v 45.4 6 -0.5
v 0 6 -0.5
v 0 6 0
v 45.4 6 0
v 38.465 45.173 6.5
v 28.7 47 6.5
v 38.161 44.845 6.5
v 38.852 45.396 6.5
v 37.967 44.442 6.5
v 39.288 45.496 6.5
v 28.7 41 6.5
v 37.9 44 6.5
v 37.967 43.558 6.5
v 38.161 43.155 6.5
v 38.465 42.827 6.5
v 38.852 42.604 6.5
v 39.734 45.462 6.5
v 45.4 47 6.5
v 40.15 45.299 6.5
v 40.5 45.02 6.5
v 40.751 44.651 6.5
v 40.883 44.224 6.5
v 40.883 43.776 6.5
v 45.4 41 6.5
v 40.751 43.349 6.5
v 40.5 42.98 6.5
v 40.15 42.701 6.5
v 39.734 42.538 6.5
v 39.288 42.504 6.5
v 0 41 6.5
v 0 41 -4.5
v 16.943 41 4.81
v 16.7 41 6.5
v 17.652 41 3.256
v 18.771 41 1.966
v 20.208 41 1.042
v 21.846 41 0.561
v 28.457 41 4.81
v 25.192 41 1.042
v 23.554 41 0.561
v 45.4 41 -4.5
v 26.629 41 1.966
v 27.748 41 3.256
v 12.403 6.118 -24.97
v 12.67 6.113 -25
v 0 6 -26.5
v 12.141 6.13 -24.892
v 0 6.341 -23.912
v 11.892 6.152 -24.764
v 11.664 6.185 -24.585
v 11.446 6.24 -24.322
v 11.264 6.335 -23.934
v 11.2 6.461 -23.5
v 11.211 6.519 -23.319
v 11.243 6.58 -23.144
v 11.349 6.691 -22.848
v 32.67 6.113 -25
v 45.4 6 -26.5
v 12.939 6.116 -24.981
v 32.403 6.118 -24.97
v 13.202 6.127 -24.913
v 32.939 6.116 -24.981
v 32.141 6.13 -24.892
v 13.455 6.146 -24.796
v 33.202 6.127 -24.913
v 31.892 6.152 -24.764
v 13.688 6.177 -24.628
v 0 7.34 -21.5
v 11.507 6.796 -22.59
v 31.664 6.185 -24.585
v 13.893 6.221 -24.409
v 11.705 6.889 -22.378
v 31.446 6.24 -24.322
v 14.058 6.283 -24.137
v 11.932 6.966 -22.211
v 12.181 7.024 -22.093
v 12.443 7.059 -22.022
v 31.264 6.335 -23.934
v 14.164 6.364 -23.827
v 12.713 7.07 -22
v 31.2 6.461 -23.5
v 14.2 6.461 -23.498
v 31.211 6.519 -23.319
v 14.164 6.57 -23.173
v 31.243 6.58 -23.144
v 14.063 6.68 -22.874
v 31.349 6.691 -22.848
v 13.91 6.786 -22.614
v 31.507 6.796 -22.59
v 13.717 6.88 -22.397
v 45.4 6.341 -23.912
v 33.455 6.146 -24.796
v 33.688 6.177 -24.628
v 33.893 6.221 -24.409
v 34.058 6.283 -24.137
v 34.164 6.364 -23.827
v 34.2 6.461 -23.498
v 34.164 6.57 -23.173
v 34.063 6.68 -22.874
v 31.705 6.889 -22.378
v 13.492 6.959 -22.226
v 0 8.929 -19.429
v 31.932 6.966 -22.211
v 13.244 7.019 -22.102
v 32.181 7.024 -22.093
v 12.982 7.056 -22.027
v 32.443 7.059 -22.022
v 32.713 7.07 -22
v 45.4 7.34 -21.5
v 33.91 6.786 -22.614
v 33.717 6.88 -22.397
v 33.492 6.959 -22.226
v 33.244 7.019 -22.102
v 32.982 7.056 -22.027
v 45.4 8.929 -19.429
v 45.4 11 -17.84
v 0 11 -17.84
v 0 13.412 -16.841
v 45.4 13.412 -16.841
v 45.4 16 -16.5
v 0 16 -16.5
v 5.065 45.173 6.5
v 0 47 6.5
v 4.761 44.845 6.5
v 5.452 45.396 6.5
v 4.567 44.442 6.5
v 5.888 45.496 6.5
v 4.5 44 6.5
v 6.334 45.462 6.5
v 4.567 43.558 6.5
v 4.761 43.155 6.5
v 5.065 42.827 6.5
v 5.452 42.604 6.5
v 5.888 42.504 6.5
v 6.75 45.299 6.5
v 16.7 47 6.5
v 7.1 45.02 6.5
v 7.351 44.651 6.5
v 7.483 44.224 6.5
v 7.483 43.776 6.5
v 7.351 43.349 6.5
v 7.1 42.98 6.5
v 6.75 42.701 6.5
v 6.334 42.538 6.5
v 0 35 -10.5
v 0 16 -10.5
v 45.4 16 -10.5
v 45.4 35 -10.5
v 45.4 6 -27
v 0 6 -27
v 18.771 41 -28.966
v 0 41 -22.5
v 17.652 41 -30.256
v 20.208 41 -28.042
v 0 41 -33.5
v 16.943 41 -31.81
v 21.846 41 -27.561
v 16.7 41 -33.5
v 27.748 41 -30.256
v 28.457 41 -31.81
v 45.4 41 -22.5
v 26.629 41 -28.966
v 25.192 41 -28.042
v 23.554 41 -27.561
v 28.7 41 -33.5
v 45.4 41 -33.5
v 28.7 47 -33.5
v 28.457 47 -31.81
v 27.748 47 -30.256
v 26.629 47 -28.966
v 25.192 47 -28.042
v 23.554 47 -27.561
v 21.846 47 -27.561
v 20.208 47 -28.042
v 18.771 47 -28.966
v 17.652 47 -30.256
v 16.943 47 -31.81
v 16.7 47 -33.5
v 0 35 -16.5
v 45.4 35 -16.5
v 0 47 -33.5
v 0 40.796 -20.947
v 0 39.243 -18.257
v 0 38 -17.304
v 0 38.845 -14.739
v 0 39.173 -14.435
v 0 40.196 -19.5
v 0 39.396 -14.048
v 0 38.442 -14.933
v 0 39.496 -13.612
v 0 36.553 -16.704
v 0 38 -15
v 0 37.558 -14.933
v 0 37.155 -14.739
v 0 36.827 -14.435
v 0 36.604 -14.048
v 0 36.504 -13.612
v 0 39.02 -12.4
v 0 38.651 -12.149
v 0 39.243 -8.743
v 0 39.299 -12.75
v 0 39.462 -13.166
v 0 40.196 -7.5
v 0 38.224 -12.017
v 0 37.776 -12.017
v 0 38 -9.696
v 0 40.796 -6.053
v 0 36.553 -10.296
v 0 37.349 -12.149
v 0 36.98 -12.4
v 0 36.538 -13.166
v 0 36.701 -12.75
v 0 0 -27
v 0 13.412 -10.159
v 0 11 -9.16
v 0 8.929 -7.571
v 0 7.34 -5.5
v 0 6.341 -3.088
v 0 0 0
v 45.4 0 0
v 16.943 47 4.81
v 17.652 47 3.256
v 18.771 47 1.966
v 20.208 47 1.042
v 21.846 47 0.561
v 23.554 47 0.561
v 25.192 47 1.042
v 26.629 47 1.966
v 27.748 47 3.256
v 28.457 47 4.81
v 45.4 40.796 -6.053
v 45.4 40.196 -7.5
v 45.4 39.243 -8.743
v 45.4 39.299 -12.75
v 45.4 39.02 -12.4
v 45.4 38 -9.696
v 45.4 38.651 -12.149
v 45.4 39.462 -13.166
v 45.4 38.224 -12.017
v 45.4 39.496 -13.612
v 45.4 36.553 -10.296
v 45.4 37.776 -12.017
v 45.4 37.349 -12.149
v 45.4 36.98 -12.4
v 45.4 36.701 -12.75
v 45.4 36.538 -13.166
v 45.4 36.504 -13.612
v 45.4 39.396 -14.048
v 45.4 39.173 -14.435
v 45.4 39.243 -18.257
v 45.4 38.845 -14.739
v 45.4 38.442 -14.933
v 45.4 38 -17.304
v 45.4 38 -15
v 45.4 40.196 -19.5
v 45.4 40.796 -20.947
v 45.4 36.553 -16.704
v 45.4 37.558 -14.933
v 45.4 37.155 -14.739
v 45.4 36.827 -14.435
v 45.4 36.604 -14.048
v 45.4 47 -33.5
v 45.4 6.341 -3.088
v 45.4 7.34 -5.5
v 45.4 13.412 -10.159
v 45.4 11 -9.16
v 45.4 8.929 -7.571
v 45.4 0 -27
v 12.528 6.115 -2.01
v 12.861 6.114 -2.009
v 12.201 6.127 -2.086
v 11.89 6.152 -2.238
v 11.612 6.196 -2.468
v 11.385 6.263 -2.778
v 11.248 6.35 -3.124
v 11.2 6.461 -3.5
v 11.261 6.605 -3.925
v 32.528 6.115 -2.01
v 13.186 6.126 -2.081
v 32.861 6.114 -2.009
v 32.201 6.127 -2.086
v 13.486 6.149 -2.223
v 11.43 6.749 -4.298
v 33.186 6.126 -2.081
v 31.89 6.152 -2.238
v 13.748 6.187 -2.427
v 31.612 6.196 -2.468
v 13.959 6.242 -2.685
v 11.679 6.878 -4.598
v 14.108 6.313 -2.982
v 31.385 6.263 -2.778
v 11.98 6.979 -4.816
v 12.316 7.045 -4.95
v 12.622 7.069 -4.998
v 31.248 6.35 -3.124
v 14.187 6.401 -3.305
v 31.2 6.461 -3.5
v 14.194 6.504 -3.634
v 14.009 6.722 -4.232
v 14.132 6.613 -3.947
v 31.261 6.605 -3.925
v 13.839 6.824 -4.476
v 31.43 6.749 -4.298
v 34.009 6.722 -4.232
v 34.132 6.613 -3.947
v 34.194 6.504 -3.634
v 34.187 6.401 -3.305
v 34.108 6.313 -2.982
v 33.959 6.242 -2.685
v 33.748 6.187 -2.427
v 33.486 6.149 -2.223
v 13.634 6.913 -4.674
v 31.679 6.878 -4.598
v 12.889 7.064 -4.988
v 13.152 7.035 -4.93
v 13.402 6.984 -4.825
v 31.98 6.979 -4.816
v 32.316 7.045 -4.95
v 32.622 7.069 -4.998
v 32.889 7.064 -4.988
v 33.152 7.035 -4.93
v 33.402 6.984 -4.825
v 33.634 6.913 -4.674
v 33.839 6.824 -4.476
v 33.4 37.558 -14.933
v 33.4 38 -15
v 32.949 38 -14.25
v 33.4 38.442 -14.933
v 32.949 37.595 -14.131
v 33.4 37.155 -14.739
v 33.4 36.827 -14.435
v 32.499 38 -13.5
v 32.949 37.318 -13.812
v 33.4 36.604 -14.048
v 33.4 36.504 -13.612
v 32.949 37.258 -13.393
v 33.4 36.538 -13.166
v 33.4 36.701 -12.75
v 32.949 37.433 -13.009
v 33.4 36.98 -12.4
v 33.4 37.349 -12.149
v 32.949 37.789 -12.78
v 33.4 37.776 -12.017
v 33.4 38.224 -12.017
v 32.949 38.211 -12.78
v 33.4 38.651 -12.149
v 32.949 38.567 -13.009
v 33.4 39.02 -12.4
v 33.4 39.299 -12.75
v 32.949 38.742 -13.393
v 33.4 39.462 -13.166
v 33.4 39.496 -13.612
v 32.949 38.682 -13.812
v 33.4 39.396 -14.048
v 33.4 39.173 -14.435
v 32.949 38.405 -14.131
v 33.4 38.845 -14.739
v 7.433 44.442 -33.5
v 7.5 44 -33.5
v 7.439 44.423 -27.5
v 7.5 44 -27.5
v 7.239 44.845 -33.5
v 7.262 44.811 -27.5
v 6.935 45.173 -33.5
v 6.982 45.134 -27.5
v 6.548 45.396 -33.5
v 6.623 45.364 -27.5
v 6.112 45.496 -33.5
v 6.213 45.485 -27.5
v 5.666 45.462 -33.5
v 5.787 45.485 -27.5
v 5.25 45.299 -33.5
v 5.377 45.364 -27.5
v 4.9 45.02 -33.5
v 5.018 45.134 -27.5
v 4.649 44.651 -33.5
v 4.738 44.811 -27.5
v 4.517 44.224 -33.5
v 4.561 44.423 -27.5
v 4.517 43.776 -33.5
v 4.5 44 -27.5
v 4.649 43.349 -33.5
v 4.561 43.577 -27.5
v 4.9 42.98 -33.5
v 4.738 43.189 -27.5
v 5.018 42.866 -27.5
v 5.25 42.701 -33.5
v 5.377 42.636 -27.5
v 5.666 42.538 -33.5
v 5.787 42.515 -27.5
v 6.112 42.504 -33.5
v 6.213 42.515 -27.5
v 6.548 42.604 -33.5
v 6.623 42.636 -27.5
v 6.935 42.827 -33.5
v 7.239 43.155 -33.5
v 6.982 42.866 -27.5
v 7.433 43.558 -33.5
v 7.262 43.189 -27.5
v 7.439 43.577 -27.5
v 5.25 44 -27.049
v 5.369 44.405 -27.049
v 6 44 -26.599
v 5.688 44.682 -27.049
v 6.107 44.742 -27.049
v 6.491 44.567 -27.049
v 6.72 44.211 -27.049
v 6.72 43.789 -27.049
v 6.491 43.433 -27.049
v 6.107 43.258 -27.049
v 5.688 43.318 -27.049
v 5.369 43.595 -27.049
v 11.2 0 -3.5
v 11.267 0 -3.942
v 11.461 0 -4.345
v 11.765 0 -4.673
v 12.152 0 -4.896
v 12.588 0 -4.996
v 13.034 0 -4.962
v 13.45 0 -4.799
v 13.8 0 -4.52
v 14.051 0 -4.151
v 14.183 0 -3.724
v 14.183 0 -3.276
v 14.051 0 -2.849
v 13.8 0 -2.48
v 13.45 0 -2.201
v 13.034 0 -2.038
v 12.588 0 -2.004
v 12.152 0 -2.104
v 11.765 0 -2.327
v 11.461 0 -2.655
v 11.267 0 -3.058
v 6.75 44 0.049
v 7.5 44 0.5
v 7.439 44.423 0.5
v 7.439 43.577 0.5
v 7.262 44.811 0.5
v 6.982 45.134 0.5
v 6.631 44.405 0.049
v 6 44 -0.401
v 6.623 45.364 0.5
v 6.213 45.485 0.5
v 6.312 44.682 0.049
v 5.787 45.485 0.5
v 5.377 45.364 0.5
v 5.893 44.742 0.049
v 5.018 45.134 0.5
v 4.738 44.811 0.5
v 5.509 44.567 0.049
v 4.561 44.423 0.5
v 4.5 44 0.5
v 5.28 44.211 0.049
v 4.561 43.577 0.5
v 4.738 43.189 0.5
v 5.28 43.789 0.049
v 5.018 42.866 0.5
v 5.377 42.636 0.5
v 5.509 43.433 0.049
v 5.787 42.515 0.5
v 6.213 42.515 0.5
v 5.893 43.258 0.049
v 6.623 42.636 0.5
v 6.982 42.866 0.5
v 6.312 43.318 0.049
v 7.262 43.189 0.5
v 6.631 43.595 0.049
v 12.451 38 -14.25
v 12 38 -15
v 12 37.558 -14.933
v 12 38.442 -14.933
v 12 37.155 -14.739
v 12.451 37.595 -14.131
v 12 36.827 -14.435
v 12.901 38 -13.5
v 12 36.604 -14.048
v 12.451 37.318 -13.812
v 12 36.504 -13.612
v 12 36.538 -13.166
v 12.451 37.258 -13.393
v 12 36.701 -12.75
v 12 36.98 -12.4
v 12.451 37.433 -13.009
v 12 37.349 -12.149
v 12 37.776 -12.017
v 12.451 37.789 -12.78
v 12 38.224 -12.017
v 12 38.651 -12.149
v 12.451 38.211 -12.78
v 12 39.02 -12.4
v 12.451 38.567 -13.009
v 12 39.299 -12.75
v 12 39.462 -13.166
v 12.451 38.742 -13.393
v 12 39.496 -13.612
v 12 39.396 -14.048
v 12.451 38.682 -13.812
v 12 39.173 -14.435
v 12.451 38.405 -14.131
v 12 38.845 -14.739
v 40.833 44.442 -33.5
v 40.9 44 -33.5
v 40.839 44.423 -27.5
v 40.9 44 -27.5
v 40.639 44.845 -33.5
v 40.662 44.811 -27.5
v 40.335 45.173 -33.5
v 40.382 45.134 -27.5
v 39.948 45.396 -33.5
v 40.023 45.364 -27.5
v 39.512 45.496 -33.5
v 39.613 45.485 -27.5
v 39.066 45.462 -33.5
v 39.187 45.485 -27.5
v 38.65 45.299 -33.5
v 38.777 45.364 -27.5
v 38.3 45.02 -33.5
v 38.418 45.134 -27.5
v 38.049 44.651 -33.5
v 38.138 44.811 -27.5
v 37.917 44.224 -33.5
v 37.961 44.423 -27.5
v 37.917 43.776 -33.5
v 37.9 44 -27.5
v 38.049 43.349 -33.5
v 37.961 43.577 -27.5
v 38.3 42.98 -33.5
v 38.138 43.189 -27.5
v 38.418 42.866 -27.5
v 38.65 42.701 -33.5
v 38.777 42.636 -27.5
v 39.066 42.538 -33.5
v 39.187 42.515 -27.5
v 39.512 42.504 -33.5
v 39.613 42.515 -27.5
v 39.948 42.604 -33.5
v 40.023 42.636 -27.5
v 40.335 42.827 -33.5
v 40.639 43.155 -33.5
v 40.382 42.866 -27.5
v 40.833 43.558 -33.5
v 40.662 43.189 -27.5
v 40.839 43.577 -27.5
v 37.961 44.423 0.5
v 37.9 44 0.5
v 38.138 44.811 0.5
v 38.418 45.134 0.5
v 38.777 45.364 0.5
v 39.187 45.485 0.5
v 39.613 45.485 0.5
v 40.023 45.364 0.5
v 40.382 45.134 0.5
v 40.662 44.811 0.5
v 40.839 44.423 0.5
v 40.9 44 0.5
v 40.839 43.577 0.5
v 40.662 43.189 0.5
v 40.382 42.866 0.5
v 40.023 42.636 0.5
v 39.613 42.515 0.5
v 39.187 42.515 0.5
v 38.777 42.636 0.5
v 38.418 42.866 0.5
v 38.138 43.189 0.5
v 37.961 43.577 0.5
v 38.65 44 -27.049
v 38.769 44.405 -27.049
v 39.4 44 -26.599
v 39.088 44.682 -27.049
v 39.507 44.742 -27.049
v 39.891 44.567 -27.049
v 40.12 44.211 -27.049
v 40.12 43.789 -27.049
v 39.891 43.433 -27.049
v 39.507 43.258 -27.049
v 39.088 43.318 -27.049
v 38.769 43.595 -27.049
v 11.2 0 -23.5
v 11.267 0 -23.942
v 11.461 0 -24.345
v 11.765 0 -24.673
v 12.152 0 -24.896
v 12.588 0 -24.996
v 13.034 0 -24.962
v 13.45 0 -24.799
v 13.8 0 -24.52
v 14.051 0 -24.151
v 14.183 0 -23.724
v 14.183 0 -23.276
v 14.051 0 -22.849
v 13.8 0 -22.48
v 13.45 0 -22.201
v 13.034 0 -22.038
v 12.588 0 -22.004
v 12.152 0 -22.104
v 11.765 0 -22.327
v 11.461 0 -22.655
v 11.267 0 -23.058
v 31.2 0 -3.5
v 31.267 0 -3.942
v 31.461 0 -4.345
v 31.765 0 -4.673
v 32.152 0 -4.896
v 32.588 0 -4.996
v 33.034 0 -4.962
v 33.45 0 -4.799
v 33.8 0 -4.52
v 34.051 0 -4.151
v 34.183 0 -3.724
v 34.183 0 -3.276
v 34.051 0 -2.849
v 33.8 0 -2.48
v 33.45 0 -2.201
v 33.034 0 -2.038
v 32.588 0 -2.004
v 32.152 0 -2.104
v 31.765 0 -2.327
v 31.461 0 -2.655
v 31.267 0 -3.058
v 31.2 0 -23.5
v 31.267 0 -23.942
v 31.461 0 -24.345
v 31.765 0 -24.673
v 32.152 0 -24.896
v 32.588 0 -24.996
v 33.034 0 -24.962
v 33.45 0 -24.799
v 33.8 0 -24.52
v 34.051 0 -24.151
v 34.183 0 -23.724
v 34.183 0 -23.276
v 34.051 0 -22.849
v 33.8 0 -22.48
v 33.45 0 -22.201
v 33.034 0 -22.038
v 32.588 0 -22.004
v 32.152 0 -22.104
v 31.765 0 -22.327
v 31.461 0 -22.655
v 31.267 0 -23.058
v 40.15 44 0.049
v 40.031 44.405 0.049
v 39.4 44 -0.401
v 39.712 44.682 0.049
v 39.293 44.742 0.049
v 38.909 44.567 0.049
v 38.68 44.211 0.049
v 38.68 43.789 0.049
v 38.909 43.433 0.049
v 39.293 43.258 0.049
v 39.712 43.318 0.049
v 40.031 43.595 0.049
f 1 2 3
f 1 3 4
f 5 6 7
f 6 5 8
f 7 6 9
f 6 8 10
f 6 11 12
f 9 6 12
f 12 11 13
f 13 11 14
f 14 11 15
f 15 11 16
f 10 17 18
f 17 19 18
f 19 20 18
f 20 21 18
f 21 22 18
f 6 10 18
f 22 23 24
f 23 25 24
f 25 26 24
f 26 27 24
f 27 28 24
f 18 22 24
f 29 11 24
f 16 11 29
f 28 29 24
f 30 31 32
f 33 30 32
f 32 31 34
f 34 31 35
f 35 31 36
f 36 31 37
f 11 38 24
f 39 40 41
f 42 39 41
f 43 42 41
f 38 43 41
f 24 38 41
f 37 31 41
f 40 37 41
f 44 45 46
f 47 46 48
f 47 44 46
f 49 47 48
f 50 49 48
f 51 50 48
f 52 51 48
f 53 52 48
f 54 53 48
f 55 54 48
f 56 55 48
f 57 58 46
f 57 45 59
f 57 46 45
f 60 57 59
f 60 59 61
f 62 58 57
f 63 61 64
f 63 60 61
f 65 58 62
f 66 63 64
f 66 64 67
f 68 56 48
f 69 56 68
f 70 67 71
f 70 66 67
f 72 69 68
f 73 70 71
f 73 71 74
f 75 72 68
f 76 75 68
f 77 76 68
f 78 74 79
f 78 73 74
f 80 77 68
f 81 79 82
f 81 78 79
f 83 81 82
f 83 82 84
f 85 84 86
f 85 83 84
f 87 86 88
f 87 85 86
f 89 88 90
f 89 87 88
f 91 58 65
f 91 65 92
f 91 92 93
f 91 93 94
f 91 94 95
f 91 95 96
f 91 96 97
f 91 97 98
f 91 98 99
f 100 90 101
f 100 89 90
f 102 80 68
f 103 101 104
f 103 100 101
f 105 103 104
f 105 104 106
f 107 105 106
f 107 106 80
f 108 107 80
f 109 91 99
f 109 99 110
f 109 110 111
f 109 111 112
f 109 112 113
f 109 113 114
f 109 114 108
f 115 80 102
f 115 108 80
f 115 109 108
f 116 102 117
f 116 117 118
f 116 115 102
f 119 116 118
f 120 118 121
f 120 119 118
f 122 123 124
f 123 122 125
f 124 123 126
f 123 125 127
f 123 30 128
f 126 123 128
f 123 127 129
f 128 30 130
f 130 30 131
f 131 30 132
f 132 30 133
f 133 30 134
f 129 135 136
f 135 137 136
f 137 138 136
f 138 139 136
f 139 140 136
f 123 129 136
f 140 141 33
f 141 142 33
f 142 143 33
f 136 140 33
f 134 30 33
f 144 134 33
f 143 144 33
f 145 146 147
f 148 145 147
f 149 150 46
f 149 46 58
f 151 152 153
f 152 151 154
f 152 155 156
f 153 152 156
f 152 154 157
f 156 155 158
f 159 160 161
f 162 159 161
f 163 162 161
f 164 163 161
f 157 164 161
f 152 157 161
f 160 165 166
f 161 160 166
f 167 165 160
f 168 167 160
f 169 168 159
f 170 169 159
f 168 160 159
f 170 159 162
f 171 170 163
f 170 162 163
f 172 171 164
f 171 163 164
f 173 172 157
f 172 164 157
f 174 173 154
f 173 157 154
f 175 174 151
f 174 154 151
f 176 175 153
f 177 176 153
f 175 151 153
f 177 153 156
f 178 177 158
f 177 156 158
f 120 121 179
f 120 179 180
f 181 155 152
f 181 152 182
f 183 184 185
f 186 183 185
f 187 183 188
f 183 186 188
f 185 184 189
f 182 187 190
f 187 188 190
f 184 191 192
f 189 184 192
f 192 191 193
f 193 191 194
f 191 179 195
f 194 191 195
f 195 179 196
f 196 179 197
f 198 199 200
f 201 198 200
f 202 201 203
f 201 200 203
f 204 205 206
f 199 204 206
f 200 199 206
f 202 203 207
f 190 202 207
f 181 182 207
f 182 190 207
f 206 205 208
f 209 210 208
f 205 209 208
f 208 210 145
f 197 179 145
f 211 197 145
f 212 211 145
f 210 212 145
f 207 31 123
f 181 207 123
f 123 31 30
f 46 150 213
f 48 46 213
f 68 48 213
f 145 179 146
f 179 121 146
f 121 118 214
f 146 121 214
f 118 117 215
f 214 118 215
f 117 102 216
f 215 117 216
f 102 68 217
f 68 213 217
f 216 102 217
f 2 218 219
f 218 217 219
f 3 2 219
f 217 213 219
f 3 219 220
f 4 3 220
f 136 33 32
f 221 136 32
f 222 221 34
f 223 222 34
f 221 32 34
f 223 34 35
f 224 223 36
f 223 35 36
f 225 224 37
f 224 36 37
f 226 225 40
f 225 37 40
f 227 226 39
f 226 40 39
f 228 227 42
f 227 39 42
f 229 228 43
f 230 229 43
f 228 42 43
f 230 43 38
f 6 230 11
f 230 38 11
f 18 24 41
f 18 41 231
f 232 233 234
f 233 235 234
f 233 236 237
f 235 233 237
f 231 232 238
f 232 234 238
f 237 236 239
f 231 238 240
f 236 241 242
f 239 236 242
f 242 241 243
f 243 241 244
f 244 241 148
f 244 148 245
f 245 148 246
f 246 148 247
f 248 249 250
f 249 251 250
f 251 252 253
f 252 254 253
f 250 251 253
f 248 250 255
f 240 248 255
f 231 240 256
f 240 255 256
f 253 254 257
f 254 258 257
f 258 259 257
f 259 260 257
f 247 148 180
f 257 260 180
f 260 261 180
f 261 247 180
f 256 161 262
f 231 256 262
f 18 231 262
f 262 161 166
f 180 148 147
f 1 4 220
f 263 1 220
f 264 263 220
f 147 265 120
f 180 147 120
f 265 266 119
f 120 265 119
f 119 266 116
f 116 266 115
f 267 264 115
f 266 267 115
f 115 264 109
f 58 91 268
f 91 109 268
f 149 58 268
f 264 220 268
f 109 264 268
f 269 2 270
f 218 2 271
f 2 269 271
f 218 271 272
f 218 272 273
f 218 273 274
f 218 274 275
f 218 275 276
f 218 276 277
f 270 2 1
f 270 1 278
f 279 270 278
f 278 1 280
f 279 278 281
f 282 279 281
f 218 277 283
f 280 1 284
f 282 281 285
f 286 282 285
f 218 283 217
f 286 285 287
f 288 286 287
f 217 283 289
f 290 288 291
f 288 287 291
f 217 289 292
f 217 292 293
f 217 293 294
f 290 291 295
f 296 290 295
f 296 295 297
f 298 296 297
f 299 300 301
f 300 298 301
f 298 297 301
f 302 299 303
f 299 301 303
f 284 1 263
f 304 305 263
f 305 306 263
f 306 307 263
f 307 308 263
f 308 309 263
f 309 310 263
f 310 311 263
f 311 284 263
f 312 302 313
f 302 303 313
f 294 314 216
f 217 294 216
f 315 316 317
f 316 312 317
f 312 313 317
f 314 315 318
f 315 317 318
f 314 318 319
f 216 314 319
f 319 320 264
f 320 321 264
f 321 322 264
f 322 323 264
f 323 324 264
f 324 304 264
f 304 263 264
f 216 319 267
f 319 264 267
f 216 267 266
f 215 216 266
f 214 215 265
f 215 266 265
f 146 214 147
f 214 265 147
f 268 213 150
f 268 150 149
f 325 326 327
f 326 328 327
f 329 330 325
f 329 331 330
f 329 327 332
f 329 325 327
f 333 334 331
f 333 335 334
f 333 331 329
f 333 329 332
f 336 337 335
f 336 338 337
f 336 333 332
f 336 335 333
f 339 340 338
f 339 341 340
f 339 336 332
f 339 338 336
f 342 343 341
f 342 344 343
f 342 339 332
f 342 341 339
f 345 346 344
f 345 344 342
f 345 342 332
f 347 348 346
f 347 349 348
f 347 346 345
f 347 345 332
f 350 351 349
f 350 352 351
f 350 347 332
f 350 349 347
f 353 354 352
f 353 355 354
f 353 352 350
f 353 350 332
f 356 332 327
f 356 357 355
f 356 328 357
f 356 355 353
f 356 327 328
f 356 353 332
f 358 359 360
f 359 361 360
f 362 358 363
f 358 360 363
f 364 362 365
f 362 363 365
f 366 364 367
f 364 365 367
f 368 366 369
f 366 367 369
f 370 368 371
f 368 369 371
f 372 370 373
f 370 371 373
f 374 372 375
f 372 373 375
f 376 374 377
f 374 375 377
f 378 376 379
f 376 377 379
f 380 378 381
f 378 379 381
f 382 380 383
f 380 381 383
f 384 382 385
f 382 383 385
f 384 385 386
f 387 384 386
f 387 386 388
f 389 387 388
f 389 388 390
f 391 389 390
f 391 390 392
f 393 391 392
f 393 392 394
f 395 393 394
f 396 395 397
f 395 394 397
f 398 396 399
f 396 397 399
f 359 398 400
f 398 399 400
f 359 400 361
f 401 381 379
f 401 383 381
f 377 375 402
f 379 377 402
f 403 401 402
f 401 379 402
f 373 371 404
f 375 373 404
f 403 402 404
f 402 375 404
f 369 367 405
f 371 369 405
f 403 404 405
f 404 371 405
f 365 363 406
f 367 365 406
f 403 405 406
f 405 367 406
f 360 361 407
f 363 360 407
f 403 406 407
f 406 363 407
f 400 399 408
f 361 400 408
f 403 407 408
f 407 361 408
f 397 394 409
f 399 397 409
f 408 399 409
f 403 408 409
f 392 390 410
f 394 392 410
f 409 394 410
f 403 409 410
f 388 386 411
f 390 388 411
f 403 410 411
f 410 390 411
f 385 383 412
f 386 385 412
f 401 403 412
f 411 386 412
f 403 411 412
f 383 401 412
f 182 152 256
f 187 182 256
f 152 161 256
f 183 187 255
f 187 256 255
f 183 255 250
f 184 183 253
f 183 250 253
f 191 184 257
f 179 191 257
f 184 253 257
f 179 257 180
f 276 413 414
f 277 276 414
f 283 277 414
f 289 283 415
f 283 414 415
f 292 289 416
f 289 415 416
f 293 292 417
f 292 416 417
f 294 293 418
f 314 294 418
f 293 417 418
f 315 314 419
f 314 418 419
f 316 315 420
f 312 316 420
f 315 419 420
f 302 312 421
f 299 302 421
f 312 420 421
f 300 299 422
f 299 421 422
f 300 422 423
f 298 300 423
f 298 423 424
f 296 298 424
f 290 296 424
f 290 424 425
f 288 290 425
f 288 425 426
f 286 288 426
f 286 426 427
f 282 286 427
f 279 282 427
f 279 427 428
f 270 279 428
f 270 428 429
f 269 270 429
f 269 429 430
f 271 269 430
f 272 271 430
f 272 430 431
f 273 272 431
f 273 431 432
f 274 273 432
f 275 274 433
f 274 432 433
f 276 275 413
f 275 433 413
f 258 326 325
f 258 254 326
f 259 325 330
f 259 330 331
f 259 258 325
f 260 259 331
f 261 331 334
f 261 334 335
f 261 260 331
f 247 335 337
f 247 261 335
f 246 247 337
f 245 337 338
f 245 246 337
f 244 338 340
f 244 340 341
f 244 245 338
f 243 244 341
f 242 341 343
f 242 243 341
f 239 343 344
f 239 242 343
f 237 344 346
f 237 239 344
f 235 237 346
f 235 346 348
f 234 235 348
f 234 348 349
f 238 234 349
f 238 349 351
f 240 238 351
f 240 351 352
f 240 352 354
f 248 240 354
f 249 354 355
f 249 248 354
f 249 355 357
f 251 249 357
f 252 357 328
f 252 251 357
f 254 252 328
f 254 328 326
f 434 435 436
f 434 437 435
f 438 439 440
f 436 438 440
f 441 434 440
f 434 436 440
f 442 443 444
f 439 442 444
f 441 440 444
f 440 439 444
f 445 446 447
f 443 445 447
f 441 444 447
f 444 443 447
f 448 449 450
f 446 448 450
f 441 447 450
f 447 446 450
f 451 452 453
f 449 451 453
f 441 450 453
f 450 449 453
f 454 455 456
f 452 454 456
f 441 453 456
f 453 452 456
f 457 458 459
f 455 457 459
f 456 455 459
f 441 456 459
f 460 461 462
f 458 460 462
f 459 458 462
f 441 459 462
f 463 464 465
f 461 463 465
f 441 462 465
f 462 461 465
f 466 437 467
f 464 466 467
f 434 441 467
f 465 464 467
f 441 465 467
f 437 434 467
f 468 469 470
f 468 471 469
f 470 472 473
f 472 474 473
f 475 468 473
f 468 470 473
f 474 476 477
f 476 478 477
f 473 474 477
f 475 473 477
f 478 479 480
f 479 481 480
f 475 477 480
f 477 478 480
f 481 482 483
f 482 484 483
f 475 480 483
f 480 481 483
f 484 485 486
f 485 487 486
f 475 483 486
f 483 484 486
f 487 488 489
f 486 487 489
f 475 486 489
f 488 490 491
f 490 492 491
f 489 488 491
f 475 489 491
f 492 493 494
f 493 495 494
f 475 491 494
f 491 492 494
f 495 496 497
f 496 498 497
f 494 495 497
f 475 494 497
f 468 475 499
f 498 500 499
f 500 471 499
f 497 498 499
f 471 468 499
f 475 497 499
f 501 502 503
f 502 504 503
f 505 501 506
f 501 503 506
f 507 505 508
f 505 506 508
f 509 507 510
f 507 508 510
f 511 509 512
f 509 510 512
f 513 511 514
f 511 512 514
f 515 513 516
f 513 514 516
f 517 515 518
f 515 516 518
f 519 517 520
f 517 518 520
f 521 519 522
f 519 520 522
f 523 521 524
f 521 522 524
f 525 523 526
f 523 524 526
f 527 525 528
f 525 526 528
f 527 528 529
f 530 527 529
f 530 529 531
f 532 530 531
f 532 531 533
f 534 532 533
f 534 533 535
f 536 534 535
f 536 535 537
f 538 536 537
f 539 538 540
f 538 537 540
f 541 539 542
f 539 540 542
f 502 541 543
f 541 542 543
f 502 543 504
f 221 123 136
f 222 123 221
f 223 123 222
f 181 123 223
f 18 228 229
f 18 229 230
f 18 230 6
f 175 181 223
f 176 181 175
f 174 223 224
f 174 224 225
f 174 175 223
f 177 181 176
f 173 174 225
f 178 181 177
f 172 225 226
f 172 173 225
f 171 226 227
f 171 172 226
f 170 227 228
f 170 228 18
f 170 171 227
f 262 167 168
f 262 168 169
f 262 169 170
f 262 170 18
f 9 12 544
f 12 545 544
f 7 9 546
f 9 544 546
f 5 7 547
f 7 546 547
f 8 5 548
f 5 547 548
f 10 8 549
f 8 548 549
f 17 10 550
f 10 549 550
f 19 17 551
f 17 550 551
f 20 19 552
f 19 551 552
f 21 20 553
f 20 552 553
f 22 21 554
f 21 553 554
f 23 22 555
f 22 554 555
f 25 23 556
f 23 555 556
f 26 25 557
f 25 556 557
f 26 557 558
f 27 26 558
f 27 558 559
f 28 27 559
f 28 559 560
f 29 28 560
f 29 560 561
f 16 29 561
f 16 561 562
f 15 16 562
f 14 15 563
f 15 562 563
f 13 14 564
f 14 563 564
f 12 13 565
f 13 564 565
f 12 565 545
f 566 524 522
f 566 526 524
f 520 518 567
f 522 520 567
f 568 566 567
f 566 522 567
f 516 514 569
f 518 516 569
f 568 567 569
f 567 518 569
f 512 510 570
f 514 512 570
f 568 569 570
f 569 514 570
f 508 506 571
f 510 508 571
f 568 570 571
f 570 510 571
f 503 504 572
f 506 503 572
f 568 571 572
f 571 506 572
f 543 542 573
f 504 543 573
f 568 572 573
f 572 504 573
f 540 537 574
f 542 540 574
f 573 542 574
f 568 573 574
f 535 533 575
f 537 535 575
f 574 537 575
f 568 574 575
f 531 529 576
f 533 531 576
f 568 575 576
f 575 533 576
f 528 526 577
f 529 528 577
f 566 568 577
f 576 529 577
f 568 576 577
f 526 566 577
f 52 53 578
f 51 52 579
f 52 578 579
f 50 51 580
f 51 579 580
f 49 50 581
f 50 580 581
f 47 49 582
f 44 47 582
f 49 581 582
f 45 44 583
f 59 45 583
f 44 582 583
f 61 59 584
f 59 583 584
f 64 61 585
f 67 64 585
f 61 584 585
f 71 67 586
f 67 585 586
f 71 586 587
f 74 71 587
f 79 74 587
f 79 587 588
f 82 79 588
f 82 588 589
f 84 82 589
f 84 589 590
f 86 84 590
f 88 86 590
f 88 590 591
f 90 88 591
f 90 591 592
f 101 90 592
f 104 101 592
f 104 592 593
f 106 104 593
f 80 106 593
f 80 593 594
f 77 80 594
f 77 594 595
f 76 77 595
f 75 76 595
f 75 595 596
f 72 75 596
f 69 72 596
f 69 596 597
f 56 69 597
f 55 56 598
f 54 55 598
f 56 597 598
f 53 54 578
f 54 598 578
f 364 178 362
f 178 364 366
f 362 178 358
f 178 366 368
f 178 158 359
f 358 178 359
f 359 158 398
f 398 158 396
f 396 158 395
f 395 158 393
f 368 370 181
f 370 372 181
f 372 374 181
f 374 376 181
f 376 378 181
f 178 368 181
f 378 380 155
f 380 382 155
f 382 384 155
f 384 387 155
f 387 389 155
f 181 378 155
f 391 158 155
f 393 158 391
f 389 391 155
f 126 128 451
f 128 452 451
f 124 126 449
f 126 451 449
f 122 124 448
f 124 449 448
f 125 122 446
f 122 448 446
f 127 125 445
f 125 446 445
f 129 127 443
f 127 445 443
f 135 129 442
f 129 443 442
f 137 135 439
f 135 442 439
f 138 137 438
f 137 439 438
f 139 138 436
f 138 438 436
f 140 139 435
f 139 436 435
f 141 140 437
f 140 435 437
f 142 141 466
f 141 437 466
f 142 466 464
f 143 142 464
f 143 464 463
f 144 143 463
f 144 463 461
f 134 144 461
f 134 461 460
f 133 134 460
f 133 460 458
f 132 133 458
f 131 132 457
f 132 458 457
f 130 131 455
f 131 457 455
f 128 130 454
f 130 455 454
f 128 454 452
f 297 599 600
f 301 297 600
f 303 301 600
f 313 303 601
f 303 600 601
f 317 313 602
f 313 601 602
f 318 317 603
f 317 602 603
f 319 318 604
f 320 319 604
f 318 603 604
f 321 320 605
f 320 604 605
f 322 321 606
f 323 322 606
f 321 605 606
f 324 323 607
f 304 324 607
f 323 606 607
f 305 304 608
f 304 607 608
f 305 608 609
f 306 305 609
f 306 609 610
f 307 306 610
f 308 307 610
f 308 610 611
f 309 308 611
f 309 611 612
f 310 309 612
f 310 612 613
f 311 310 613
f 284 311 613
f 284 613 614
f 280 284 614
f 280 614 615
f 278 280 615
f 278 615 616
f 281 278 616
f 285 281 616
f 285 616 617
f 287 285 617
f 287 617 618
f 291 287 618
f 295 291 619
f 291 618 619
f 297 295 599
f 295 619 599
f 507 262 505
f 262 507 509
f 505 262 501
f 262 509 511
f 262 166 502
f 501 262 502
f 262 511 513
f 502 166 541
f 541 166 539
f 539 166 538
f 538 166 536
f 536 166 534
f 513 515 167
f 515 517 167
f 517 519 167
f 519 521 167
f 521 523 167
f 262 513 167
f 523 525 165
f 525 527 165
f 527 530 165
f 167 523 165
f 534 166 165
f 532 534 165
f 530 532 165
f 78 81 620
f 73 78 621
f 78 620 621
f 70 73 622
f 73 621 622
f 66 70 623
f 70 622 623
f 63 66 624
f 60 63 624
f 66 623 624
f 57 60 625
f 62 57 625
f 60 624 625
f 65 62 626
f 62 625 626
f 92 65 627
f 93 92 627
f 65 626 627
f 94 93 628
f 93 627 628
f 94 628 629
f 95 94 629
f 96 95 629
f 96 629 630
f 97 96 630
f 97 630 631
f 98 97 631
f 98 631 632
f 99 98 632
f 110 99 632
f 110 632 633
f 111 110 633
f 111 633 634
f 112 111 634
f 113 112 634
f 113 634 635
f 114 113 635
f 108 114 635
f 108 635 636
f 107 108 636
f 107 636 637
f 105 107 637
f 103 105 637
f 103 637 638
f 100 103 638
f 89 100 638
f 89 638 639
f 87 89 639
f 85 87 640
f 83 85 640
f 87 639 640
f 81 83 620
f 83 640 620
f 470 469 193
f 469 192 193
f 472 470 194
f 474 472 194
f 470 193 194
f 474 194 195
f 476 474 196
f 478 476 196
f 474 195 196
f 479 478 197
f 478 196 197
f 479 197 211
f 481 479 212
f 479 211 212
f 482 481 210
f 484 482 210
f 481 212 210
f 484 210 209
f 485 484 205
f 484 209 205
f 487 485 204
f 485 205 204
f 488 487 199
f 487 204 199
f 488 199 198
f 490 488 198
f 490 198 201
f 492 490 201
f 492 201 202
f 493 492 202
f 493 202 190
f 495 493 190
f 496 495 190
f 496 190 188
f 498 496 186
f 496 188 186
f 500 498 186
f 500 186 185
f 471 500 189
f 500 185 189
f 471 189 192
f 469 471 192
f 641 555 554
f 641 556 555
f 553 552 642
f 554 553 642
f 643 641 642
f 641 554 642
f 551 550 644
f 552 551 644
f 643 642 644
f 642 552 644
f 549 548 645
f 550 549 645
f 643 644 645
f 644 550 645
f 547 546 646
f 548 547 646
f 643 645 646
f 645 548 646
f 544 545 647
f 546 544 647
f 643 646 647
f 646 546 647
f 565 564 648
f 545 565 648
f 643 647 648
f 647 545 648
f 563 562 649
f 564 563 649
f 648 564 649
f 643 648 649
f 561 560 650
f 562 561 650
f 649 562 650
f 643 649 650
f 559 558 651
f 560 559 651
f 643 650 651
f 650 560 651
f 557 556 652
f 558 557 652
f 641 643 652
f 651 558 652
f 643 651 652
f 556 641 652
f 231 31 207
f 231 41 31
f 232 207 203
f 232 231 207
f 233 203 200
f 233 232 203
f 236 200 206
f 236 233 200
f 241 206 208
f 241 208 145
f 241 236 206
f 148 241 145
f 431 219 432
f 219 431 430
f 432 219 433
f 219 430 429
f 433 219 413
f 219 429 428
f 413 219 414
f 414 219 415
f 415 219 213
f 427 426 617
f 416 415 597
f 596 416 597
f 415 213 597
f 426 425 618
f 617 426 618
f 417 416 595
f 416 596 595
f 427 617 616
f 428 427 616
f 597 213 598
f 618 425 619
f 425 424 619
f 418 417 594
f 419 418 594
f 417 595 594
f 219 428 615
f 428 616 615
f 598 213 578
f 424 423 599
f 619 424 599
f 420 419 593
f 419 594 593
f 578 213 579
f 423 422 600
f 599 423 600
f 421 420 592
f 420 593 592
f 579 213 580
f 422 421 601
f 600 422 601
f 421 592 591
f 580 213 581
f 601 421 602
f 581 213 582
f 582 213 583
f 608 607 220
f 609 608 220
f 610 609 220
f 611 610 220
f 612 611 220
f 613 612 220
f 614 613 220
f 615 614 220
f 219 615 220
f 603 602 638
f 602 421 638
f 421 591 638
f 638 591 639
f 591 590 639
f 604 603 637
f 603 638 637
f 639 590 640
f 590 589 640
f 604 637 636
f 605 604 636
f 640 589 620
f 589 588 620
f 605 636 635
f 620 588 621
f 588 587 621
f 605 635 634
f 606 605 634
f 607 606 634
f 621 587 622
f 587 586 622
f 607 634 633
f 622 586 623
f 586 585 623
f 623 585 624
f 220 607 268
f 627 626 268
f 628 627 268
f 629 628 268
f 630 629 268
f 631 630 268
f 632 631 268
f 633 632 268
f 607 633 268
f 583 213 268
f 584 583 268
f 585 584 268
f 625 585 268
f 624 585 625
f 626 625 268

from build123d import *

# Parameters (mm, degrees)
SKETCH1_W                    = 45.4
SKETCH1_H                    = 27
BOSS_EXTRUDE1_DEPTH          = 6
SKETCH4_W                    = 45.4
SKETCH4_H                    = 6
BOSS_EXTRUDE2_DEPTH          = 35
FILLET3_R                    = 10
F_3_0MM_DOWEL_HOLE1_D        = 3
BOSS_EXTRUDE3_DEPTH          = 6
FILLET4_R                    = 6
F_3_0_3_DIAMETER_HOLE1_D     = 3
F_3_0_3_DIAMETER_HOLE1_DEPTH = 6
F_3_0_3_DIAMETER_HOLE1_TIP   = 0.901290929
F_3_0_3_DIAMETER_HOLE2_D     = 3
F_3_0_3_DIAMETER_HOLE2_DEPTH = 6
F_3_0_3_DIAMETER_HOLE2_TIP   = 0.901290929


with BuildPart() as part:
    # Sketch1 → Boss-Extrude1 (new body)
    with BuildSketch(Plane(origin=(0, 0, 0), x_dir=(1, 0, 0), z_dir=(0, 1, 0))):
        with Locations((22.7, 13.5)):
            Rectangle(SKETCH1_W, SKETCH1_H)
    extrude(amount=BOSS_EXTRUDE1_DEPTH)

    # Sketch4 → Boss-Extrude2 (add)
    with BuildSketch(Plane(origin=(0, 6, 0), x_dir=(1, 0, 0), z_dir=(0, 1, 0))):
        with Locations((22.7, 13.5)):
            Rectangle(SKETCH4_W, SKETCH4_H)
    extrude(amount=BOSS_EXTRUDE2_DEPTH)

    # Fillet3
    fillet3_edges = [part.edges().sort_by_distance(p)[0] for p in [
        (22.7, 6, -10.5),
        (22.7, 6, -16.5),
    ]]
    fillet(fillet3_edges, radius=FILLET3_R)

    # Ø3.0mm Dowel Hole1 (through all)
    with Locations(Plane(origin=(0, 16, 0), x_dir=(1, 0, 0), z_dir=(0, 1, 0))):
        with Locations((12.7, 23.5), (32.7, 23.5), (32.7, 3.5), (12.7, 3.5)):
            Hole(F_3_0MM_DOWEL_HOLE1_D / 2)

    # Sketch5 → Boss-Extrude3 (add)
    with BuildSketch(Plane(origin=(0, 41, 0), x_dir=(1, 0, 0), z_dir=(0, 1, 0))):
        with BuildLine():
            Line((45.4, 33.5), (28.7, 33.5))
            ThreePointArc((28.7, 33.5), (22.7, 27.5), (16.7, 33.5))
            Line((16.7, 33.5), (0, 33.5))
            Line((0, 33.5), (0, -6.5))
            Line((0, -6.5), (16.7, -6.5))
            ThreePointArc((16.7, -6.5), (22.7, -0.5), (28.7, -6.5))
            Line((28.7, -6.5), (45.4, -6.5))
            Line((45.4, -6.5), (45.4, 33.5))
        make_face()
    extrude(amount=BOSS_EXTRUDE3_DEPTH)

    # Fillet4
    fillet4_edges = [part.edges().sort_by_distance(p)[0] for p in [
        (22.7, 41, -10.5),
        (22.7, 41, -16.5),
    ]]
    fillet(fillet4_edges, radius=FILLET4_R)

    # Ø3.0 (3) Diameter Hole1
    with Locations(Plane.XY.offset(6.5)):
        with Locations((6, 44), (39.4, 44)):
            Hole(F_3_0_3_DIAMETER_HOLE1_D / 2, depth=F_3_0_3_DIAMETER_HOLE1_DEPTH)
            with Locations((0, 0, -(F_3_0_3_DIAMETER_HOLE1_DEPTH + F_3_0_3_DIAMETER_HOLE1_TIP / 2))):  # 118° drill point
                Cone(0, F_3_0_3_DIAMETER_HOLE1_D / 2, F_3_0_3_DIAMETER_HOLE1_TIP, mode=Mode.SUBTRACT)

    # Ø3.0 (3) Diameter Hole2
    with Locations(Plane(origin=(0, 0, -33.5), x_dir=(-1, 0, 0), z_dir=(0, 0, -1))):
        with Locations((-39.4, 44), (-6, 44)):
            Hole(F_3_0_3_DIAMETER_HOLE2_D / 2, depth=F_3_0_3_DIAMETER_HOLE2_DEPTH)
            with Locations((0, 0, -(F_3_0_3_DIAMETER_HOLE2_DEPTH + F_3_0_3_DIAMETER_HOLE2_TIP / 2))):  # 118° drill point
                Cone(0, F_3_0_3_DIAMETER_HOLE2_D / 2, F_3_0_3_DIAMETER_HOLE2_TIP, mode=Mode.SUBTRACT)

    # Sketch12 → Ø3.0 (3) Diameter Hole3 (revolve, cut)
    with BuildSketch(Plane(origin=(45.4, 38, -13.5), x_dir=(0, 0, -1), z_dir=(0, 1, 0))):
        Polygon((0, 0), (0, 12.901290929), (1.5, 12), (1.5, 0), align=None)
    f_3_0_3_diameter_hole3 = revolve(axis=Axis((51.75, 38, -13.5), (-1, 0, 0)), mode=Mode.SUBTRACT)

    # Mirror1: Ø3.0 (3) Diameter Hole3 across plane
    add(f_3_0_3_diameter_hole3.mirror(Plane.ZY.offset(-22.7)), mode=Mode.SUBTRACT)


solid = part.part
